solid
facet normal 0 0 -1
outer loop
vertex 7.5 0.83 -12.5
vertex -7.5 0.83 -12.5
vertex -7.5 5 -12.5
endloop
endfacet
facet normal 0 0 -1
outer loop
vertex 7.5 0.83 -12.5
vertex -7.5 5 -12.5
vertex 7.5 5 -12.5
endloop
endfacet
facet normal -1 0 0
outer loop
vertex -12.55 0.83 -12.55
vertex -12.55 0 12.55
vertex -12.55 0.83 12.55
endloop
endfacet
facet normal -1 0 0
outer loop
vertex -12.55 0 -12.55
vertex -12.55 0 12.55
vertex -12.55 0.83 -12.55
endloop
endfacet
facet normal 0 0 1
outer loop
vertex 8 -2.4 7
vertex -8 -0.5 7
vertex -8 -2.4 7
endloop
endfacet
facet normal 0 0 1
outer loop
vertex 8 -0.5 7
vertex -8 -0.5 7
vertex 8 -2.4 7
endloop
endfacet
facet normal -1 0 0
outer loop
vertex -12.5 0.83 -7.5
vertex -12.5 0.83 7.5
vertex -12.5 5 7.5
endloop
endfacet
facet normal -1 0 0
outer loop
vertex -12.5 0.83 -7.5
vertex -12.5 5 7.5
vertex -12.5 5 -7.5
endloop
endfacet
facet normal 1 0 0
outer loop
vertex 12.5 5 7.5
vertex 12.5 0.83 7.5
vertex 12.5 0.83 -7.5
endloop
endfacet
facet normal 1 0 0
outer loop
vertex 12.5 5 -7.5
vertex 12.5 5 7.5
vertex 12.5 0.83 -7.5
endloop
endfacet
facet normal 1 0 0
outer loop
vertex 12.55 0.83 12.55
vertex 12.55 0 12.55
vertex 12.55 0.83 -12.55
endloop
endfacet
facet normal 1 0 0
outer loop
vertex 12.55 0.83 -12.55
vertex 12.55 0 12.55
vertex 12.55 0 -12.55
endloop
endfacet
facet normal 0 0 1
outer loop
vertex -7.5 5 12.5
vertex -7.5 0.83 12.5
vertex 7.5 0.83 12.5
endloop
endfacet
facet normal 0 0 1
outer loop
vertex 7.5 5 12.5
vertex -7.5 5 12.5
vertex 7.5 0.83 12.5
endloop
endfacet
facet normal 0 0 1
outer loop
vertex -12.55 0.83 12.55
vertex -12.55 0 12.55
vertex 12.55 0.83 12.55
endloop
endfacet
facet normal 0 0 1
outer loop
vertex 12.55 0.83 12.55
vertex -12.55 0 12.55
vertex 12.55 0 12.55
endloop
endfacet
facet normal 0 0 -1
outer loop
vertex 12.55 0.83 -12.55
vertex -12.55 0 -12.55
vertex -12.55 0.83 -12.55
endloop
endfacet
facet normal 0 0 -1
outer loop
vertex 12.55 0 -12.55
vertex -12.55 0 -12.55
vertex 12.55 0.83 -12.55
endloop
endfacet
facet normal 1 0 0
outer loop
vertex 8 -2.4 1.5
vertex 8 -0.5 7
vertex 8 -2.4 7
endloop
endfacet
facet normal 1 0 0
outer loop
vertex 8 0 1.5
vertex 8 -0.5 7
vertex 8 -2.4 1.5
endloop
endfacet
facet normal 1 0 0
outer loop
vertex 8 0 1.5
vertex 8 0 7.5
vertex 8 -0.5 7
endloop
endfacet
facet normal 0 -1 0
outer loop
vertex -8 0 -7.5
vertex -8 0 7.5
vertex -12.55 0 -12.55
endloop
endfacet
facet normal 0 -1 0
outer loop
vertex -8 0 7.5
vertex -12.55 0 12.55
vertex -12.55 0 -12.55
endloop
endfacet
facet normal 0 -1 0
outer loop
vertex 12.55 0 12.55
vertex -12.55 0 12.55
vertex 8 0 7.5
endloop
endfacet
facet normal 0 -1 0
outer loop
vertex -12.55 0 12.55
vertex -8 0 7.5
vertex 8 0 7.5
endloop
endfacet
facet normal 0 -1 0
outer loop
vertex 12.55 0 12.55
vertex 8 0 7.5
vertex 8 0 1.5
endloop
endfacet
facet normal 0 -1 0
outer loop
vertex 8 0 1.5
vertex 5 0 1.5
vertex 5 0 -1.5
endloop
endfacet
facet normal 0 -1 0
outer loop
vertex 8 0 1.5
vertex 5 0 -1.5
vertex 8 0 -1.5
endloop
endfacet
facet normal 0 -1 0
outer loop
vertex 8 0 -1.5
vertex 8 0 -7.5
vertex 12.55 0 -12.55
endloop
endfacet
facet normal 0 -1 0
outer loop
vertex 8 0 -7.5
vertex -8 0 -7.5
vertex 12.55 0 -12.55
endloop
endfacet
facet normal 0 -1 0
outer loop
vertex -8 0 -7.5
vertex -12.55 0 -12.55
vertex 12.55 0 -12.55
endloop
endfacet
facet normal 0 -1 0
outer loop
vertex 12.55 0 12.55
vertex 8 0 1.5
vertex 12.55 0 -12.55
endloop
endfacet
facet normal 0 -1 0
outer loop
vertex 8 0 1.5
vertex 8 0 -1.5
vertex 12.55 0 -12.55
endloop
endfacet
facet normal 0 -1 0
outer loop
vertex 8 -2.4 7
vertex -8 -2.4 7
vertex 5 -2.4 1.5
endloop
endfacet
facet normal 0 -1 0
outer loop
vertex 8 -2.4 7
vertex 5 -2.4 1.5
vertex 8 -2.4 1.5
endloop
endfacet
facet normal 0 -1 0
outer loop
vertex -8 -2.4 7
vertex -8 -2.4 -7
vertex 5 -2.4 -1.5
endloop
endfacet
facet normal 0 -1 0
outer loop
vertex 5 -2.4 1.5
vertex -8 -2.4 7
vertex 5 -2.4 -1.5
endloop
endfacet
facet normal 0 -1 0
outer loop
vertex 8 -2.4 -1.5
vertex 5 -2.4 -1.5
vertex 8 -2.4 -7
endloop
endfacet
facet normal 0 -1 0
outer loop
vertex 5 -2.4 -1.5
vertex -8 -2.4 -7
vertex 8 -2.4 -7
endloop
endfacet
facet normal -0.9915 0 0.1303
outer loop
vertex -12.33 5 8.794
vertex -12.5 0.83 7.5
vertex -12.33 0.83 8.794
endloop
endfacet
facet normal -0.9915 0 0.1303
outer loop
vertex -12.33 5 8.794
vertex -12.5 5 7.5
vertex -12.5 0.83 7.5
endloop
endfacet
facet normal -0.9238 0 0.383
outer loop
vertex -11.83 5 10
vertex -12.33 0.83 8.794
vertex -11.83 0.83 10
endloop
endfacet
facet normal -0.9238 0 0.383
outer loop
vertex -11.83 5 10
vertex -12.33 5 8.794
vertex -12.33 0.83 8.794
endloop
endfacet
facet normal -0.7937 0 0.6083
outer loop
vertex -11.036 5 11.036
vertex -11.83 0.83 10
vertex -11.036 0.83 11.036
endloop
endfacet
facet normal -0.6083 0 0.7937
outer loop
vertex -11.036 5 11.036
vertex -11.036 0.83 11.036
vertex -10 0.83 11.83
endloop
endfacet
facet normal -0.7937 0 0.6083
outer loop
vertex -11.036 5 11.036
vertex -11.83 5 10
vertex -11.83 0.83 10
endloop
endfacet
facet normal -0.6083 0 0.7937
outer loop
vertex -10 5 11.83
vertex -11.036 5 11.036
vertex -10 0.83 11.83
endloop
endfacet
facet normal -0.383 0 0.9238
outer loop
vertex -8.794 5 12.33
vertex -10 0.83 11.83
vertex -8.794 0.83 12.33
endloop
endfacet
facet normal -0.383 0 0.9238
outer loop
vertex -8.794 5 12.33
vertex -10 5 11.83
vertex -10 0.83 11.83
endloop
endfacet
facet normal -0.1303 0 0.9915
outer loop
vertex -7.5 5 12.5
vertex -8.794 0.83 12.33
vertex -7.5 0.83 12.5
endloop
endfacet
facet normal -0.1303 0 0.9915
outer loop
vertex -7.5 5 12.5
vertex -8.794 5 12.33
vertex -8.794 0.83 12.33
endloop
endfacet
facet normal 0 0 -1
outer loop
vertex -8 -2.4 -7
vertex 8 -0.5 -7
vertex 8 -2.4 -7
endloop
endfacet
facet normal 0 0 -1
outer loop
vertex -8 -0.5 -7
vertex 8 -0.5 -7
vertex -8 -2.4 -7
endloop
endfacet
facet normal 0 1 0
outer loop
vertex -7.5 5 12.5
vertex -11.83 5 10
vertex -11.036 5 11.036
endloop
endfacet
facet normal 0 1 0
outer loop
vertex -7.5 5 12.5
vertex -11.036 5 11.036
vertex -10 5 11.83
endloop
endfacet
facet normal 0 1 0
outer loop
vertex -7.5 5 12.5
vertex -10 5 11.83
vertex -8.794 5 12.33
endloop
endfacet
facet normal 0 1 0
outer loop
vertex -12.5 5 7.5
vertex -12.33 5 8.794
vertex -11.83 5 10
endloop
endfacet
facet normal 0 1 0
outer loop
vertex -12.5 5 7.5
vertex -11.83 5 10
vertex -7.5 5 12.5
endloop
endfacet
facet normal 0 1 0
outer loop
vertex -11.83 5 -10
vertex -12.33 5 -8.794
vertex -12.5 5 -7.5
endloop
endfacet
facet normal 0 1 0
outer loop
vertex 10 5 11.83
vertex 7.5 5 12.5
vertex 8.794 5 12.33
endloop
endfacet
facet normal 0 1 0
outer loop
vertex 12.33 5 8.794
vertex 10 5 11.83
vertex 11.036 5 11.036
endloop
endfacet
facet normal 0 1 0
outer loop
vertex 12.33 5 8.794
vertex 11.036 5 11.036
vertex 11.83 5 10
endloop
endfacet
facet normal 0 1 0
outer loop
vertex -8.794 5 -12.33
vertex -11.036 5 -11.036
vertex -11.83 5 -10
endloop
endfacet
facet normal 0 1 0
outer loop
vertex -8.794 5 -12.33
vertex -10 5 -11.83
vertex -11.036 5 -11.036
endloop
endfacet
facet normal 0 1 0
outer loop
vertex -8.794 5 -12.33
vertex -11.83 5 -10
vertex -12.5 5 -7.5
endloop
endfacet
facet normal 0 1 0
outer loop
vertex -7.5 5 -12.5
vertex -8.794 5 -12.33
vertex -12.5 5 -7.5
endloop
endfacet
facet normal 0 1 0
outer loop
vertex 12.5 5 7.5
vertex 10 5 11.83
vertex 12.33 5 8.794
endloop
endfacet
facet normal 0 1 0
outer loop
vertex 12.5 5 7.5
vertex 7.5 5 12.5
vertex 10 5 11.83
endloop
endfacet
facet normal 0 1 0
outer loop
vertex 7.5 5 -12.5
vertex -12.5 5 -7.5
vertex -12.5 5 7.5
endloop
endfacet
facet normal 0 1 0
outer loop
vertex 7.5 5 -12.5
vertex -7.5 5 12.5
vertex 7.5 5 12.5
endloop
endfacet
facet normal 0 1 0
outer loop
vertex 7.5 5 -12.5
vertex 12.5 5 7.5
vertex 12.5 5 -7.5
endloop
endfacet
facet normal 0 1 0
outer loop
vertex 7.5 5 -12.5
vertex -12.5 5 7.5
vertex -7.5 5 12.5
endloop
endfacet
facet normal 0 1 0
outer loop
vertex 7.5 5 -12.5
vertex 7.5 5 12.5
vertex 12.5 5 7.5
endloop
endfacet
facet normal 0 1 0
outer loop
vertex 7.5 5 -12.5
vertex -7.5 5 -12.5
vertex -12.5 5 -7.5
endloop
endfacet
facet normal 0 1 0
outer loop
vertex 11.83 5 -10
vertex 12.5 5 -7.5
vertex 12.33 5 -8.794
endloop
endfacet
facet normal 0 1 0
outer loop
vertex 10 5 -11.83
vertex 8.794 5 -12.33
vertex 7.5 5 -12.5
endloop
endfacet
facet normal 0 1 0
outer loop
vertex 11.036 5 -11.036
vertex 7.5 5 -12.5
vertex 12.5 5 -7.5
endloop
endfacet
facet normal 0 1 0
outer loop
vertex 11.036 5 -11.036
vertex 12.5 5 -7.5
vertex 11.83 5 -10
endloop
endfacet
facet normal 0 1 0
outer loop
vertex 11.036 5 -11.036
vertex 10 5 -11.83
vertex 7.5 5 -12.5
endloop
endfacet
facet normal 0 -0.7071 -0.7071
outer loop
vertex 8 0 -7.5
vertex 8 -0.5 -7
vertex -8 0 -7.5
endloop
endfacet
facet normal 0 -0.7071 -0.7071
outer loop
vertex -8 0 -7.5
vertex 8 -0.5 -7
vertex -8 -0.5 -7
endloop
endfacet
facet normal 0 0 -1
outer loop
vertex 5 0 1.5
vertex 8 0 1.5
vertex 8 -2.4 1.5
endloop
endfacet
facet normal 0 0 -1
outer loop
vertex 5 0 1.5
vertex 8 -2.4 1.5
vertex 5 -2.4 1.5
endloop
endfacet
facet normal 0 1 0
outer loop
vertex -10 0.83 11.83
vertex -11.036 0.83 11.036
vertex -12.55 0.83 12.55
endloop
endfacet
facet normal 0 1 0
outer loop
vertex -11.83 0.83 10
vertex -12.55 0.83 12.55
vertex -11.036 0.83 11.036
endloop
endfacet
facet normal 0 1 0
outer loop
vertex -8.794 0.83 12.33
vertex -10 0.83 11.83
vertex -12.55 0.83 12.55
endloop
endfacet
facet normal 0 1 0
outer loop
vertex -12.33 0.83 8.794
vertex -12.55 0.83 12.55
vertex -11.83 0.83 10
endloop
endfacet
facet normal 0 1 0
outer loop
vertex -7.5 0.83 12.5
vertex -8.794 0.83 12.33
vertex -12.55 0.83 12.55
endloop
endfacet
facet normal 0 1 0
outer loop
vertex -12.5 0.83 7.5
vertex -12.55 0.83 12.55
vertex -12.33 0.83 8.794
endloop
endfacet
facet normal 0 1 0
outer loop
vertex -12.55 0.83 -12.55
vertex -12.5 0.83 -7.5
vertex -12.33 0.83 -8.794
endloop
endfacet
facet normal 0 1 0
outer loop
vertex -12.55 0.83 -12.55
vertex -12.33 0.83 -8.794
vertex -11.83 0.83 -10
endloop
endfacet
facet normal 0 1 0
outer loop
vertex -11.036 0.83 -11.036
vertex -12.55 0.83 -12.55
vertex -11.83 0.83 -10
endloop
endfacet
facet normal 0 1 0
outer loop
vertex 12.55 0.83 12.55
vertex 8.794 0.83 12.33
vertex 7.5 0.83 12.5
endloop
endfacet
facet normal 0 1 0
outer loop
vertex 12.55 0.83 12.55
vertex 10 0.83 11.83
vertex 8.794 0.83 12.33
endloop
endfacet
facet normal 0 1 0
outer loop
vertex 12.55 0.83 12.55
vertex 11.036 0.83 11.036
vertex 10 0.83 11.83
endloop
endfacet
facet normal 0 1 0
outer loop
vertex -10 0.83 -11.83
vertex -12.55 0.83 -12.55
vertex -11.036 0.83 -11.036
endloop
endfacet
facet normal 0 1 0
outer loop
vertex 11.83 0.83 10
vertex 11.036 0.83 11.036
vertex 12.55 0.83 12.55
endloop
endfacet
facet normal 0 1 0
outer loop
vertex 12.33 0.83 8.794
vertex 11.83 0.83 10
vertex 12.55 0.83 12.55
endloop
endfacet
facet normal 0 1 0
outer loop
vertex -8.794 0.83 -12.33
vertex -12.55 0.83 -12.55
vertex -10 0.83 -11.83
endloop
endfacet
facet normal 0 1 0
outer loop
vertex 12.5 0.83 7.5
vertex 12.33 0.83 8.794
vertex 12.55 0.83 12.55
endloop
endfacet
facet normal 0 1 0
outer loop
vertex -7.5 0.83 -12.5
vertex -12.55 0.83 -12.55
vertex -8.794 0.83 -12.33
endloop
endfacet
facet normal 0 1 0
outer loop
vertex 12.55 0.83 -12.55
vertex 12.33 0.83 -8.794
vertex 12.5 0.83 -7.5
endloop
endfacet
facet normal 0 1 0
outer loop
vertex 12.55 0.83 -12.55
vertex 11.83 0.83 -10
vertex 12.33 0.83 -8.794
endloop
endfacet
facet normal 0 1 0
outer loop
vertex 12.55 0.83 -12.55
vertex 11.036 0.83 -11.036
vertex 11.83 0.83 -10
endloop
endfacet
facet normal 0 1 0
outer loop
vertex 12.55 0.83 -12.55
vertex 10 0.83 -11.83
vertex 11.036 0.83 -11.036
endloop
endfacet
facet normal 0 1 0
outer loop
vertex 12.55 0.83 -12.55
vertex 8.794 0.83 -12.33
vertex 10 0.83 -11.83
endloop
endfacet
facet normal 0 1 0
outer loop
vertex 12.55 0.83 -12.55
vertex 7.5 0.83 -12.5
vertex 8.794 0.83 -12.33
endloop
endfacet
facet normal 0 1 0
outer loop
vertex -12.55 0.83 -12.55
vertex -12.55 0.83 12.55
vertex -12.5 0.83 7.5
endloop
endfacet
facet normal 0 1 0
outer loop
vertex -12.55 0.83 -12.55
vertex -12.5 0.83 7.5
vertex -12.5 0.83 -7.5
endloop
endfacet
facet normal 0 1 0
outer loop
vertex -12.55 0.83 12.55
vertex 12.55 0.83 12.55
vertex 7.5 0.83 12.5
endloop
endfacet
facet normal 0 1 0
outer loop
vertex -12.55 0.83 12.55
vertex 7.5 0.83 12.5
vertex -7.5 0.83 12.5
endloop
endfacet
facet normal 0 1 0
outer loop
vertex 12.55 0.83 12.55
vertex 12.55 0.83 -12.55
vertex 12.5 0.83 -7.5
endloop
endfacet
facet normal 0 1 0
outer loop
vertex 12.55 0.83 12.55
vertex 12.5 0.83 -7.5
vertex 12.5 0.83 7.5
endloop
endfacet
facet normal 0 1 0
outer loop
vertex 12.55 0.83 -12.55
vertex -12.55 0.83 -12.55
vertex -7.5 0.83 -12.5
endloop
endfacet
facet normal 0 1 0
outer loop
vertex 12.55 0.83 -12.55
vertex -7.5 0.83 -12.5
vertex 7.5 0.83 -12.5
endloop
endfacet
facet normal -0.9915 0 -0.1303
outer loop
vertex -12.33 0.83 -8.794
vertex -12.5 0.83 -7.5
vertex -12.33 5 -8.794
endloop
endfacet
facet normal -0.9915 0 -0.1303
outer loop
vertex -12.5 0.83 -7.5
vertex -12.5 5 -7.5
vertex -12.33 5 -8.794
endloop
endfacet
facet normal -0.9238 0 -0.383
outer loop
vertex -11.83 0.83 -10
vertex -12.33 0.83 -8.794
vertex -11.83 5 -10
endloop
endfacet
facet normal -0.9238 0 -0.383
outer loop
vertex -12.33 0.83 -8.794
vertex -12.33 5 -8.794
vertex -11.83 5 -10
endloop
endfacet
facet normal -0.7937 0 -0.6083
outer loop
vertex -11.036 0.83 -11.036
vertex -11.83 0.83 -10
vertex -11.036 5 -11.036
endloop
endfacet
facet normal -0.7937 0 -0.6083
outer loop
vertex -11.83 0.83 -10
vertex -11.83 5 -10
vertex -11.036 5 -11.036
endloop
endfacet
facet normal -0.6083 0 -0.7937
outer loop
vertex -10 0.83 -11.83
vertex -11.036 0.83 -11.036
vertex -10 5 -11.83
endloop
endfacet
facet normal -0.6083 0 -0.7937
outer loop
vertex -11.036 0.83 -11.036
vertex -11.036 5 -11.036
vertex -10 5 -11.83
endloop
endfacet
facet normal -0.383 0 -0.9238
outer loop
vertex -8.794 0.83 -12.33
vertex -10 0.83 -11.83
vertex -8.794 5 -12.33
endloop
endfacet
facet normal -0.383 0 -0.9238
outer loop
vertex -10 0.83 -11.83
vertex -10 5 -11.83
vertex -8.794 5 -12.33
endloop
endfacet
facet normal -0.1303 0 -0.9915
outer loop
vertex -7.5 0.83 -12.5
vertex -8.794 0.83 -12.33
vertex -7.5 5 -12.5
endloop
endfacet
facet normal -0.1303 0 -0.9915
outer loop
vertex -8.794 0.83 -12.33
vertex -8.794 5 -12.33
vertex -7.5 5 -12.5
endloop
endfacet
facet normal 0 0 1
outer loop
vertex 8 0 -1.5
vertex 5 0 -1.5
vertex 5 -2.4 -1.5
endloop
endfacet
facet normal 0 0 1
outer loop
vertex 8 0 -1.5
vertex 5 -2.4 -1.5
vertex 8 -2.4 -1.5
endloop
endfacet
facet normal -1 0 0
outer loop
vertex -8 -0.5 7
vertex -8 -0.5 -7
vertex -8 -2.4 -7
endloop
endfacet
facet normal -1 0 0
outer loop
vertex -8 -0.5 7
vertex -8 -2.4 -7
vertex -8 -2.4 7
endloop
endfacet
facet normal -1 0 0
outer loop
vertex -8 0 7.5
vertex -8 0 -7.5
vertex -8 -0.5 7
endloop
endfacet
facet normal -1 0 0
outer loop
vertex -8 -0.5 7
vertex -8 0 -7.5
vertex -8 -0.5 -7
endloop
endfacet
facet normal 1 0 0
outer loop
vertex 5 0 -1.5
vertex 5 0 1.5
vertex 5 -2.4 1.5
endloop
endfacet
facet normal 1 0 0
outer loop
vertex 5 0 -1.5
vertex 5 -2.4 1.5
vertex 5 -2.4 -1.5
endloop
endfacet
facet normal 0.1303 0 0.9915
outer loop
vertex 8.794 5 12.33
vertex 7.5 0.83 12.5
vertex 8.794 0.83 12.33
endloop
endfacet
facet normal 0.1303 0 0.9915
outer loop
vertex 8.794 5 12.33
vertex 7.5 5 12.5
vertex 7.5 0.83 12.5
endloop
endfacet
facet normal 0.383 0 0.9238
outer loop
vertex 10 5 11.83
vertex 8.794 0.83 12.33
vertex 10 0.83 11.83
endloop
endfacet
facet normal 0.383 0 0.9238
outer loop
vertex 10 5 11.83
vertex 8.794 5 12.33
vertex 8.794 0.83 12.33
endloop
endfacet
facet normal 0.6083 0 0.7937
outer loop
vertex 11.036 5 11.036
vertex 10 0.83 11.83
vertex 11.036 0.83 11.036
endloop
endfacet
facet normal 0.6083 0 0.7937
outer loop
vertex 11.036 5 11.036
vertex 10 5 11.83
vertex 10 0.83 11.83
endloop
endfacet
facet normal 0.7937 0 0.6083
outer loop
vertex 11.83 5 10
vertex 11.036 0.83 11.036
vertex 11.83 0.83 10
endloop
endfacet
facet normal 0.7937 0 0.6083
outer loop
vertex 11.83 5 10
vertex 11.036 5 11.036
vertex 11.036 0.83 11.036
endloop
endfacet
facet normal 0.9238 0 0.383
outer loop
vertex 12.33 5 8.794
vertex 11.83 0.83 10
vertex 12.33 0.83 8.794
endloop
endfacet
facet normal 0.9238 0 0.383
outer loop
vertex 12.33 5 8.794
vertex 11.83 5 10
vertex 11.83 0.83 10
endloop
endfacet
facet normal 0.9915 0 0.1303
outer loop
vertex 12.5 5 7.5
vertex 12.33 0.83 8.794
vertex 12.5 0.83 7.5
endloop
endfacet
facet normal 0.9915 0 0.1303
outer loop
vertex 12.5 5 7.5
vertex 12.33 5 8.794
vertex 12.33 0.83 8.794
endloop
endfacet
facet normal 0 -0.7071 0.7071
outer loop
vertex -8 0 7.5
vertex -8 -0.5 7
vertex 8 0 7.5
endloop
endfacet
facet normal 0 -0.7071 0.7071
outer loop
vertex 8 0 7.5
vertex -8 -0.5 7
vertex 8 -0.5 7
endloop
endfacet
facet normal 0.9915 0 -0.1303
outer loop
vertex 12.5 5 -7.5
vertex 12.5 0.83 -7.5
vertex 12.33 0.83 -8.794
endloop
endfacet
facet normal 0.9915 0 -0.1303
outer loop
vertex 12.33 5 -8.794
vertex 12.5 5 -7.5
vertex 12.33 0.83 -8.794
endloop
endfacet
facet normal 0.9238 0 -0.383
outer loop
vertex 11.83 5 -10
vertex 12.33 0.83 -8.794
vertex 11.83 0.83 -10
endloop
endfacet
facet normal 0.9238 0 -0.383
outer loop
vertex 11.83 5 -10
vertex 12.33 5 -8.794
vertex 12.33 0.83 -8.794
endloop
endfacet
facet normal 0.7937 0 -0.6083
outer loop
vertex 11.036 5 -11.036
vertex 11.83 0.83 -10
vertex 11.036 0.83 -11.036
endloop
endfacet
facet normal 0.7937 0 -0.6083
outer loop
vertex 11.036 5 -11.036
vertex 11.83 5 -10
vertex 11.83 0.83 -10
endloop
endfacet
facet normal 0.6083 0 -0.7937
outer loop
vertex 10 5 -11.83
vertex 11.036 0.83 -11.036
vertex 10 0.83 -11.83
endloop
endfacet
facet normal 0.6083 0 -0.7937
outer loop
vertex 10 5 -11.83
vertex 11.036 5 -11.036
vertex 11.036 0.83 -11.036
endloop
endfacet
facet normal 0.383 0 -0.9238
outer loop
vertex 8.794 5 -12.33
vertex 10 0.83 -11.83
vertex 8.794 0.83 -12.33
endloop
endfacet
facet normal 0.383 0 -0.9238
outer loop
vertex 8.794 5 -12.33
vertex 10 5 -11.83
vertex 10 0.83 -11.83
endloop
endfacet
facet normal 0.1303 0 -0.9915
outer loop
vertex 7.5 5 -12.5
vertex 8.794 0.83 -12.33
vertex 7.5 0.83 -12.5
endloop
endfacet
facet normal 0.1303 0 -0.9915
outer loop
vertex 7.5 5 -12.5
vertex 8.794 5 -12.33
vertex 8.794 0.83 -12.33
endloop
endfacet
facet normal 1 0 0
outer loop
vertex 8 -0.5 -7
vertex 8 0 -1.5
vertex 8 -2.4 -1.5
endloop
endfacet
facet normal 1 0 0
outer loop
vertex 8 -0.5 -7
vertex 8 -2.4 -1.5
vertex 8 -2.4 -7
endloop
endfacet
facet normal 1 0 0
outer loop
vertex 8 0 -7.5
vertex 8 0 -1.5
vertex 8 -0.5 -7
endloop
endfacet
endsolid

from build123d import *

# Parameters (mm, degrees)
SKETCH1_W           = 25.1
SKETCH1_H           = 25.1
BOSS_EXTRUDE1_DEPTH = 0.83
SKETCH2_W           = 25
SKETCH2_H           = 25
BOSS_EXTRUDE2_DEPTH = 5
FILLET1_R           = 5
BOSS_EXTRUDE3_DEPTH = 2.4
CHAMFER1_SIZE       = 0.5


with BuildPart() as part:
    # Sketch1 → Boss-Extrude1 (new body)
    with BuildSketch(Plane(origin=(0, 0, 0), x_dir=(1, 0, 0), z_dir=(0, 1, 0))):
        Rectangle(SKETCH1_W, SKETCH1_H)
    extrude(amount=BOSS_EXTRUDE1_DEPTH)

    # Sketch2 → Boss-Extrude2 (add)
    with BuildSketch(Plane(origin=(0, 0, 0), x_dir=(1, 0, 0), z_dir=(0, 1, 0))):
        Rectangle(SKETCH2_W, SKETCH2_H)
    extrude(amount=BOSS_EXTRUDE2_DEPTH)

    # Fillet1
    fillet1_edges = [part.edges().sort_by_distance(p)[0] for p in [
        (12.5, 2.915, 12.5),
        (12.5, 2.915, -12.5),
        (-12.5, 2.915, -12.5),
        (-12.5, 2.915, 12.5),
    ]]
    fillet(fillet1_edges, radius=FILLET1_R)

    # Sketch3 → Boss-Extrude3 (add)
    with BuildSketch(Plane(origin=(0, 0, 0), x_dir=(1, 0, 0), z_dir=(0, 1, 0))):
        Polygon((8, 7), (-8, 7), (-8, -7), (8, -7), (8, -1.5), (5, -1.5), (5, 1.5), (8, 1.5), align=None)
    extrude(amount=-BOSS_EXTRUDE3_DEPTH)

    # Chamfer1
    chamfer1_edges = [part.edges().sort_by_distance(p)[0] for p in [
        (0, 0, -7),
        (0, 0, 7),
    ]]
    chamfer(chamfer1_edges, length=CHAMFER1_SIZE)


solid = part.part
